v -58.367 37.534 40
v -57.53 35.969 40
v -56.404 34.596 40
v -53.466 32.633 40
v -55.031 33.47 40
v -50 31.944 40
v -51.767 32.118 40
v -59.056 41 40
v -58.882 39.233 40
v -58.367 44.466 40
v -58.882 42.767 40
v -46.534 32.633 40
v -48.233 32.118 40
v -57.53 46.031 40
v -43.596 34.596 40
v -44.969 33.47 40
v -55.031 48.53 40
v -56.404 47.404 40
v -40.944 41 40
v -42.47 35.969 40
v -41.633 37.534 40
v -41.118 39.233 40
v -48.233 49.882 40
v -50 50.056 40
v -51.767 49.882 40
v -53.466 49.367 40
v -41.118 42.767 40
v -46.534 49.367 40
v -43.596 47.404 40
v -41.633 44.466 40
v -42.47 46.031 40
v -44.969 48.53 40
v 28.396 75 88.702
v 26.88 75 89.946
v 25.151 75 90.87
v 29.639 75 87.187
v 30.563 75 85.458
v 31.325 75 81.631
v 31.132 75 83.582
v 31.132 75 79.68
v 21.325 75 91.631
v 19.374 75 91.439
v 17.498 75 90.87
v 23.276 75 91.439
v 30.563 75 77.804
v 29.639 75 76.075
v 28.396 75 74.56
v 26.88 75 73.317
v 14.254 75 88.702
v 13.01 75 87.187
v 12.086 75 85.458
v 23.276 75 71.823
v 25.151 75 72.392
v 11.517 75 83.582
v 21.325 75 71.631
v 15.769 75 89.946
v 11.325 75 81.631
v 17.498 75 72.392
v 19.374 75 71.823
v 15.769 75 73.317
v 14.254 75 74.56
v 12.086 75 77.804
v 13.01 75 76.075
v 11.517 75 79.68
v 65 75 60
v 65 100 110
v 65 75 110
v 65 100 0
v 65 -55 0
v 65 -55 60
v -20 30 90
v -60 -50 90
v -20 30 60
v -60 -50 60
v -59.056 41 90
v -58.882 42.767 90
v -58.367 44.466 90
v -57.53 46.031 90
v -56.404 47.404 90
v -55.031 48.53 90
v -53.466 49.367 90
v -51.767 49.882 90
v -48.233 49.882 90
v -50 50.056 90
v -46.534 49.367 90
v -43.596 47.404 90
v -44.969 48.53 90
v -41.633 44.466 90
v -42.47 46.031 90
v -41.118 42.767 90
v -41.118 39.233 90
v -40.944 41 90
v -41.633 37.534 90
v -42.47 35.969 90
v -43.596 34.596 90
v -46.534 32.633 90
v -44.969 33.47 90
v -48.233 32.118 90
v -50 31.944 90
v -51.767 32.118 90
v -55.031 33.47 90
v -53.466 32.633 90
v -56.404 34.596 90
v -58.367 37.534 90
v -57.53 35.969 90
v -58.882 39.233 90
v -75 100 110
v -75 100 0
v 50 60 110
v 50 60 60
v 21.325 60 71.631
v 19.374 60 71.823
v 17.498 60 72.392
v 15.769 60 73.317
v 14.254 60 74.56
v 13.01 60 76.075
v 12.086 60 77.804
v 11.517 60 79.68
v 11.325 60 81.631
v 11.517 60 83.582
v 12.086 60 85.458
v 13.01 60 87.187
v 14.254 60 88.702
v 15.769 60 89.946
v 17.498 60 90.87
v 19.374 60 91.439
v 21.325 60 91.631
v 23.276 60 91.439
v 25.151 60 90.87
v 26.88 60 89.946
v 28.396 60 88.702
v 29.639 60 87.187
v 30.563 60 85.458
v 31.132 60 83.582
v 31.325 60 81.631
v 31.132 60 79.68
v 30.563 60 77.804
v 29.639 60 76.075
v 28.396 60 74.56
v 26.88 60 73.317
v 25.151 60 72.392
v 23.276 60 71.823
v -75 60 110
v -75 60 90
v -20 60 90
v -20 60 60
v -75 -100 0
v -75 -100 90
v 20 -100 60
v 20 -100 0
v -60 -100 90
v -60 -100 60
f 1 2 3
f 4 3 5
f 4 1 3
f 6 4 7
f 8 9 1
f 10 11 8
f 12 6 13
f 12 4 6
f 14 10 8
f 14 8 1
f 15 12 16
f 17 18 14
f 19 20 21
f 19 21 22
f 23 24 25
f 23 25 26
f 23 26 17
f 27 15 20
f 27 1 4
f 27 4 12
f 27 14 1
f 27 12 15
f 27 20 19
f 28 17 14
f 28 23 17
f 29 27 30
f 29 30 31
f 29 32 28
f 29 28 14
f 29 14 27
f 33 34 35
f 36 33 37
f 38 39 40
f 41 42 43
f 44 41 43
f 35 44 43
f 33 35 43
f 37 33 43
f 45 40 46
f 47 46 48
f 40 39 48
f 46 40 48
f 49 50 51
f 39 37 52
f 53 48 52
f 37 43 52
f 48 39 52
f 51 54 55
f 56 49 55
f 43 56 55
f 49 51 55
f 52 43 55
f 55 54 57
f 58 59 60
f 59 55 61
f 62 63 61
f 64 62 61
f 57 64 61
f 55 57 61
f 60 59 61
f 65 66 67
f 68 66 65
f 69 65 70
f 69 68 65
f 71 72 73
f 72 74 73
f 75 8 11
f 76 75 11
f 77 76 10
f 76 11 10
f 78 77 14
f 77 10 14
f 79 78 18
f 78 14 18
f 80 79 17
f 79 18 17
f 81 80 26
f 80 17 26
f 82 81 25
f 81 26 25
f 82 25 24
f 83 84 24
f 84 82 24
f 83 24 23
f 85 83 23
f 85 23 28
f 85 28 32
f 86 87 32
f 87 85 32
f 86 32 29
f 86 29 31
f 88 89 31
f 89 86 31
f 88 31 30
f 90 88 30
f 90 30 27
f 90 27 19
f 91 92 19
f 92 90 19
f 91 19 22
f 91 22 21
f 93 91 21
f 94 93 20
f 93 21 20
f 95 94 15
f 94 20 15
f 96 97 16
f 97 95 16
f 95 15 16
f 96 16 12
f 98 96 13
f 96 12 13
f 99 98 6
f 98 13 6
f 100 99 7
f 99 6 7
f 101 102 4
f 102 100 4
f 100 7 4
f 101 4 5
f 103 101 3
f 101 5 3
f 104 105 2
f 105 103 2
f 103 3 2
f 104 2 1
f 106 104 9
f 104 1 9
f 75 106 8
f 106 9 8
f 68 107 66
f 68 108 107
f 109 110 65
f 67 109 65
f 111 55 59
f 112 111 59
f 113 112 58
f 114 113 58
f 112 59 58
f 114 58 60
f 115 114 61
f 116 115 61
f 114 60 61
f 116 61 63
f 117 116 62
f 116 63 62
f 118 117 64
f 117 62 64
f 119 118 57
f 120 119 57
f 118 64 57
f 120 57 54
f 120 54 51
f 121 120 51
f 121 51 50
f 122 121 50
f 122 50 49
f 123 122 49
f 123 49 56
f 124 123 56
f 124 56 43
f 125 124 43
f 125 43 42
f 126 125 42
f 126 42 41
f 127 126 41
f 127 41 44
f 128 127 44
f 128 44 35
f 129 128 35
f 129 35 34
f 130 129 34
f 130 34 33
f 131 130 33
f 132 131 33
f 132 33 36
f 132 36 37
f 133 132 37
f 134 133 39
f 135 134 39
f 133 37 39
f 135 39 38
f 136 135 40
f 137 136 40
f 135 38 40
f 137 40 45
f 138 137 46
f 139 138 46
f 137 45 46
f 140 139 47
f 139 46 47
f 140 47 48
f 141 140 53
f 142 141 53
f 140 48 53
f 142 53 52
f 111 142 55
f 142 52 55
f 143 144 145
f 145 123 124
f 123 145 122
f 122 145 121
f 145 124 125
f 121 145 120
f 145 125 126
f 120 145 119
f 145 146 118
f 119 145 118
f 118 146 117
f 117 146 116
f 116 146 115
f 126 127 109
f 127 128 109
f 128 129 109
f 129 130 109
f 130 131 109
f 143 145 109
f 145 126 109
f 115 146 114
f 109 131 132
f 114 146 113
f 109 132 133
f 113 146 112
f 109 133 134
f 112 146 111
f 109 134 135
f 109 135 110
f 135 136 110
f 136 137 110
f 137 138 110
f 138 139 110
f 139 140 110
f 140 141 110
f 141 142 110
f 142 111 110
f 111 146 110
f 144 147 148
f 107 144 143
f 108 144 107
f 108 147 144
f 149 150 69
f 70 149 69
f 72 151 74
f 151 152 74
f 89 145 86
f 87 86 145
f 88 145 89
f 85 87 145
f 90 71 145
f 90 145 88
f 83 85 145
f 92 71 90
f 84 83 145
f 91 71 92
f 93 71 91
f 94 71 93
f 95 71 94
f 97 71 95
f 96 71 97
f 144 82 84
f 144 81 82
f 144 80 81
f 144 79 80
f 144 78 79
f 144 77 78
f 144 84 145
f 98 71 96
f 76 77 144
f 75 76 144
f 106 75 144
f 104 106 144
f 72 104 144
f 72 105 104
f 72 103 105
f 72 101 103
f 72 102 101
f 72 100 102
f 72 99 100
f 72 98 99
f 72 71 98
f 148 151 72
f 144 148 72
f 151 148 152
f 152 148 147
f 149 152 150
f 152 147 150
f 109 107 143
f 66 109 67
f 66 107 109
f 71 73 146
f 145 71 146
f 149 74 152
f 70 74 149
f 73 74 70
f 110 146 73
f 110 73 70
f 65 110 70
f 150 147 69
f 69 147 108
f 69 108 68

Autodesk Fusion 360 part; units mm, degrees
sketch "Sketch1" plane through (0, 0, 0) normal (0, 0, 1) x (1, 0, 0)
  line L0 (-75, 100) -> (65, 100)
  line L1 (65, 100) -> (65, -100)
  line L2 (65, -100) -> (-75, -100)
  line L3 (-75, -100) -> (-75, 100)
  line L4 (38.9966, -100) -> (40, -100)
  line L5 (20, -100) -> (65, -55)
  line L6 (-60, -100) -> (-60, -50)
  line L7 (-60, -50) -> (-20, 30)
  line L8 (-20, 30) -> (-20, 60)
  line L9 (-20, 60) -> (50, 60)
  line L10 (50, 60) -> (70, 80)
  line L11 (70, 80) -> (70, 100)
  line L12 (-20, 60) -> (-75, 60)
extrude "Extrude1" add sketch "Sketch1" along normal blind 20 contours L1 L2 L5 L6 L7 L8 L9 L10
extrude "Extrude2" add sketch "Sketch1" along normal blind 40 contours L2 L3 L6 L7 L8 L12
extrude "Extrude3" add sketch "Sketch1" along normal blind 70 contours L0 L1 L3 L9 L10 L12
sketch "Sketch2" plane through (0, 0, 40) normal (0, 0, 1) x (-1, 0, 0)
  line L0 (60, 100) -> (60, 50)
  line L1 (60, 50) -> (20, -30)
  line L2 (20, -30) -> (20, -60)
  line L3 (20, -60) -> (75, -60)
  line L4 (75, -60) -> (75, 100)
  line L5 (75, 100) -> (60, 100)
  circle A0 centre (50, -41) radius 9.056
sketch "Sketch3" plane through (0, 60, 0) normal (0, -1, 0) x (1, 0, 0)
  line L0 (-75, 40) -> (-20, 40)
  line L1 (-20, 40) -> (-20, 20)
  line L2 (-20, 20) -> (50, 20)
  line L3 (50, 20) -> (50, 70)
  line L4 (50, 70) -> (-75, 70)
  line L5 (-75, 70) -> (-75, 40)
  circle A0 centre (20, 45) radius 11.8346
extrude "Extrude4" add 1 faces at (-5, -25, 20) along direction (0, 0, 1) blind 40
extrude "Extrude5" add sketch "Sketch2" along normal blind 50
extrude "Extrude6" add 1 faces at (-10, 86.6667, 70) along direction (0, 0, 1) blind 40
sketch "Sketch4" plane through (0, 60, 0) normal (0, -1, 0) x (1, 0, 0)
  line L0 (-20, 90) -> (-20, 60)
  line L1 (-20, 60) -> (50, 60)
  line L2 (50, 60) -> (50, 110)
  line L3 (50, 110) -> (-75, 110)
  line L4 (-75, 110) -> (-75, 90)
  line L5 (-75, 90) -> (-20, 90)
hole "Hole1" at (21.3246, 60, 81.6312) direction (0, 1, 0) diameter 20 depth 15 tip angle 180
sketch "Sketch5" plane through (0, 0, 0) normal (0, 0, 1) x (1, 0, 0)
